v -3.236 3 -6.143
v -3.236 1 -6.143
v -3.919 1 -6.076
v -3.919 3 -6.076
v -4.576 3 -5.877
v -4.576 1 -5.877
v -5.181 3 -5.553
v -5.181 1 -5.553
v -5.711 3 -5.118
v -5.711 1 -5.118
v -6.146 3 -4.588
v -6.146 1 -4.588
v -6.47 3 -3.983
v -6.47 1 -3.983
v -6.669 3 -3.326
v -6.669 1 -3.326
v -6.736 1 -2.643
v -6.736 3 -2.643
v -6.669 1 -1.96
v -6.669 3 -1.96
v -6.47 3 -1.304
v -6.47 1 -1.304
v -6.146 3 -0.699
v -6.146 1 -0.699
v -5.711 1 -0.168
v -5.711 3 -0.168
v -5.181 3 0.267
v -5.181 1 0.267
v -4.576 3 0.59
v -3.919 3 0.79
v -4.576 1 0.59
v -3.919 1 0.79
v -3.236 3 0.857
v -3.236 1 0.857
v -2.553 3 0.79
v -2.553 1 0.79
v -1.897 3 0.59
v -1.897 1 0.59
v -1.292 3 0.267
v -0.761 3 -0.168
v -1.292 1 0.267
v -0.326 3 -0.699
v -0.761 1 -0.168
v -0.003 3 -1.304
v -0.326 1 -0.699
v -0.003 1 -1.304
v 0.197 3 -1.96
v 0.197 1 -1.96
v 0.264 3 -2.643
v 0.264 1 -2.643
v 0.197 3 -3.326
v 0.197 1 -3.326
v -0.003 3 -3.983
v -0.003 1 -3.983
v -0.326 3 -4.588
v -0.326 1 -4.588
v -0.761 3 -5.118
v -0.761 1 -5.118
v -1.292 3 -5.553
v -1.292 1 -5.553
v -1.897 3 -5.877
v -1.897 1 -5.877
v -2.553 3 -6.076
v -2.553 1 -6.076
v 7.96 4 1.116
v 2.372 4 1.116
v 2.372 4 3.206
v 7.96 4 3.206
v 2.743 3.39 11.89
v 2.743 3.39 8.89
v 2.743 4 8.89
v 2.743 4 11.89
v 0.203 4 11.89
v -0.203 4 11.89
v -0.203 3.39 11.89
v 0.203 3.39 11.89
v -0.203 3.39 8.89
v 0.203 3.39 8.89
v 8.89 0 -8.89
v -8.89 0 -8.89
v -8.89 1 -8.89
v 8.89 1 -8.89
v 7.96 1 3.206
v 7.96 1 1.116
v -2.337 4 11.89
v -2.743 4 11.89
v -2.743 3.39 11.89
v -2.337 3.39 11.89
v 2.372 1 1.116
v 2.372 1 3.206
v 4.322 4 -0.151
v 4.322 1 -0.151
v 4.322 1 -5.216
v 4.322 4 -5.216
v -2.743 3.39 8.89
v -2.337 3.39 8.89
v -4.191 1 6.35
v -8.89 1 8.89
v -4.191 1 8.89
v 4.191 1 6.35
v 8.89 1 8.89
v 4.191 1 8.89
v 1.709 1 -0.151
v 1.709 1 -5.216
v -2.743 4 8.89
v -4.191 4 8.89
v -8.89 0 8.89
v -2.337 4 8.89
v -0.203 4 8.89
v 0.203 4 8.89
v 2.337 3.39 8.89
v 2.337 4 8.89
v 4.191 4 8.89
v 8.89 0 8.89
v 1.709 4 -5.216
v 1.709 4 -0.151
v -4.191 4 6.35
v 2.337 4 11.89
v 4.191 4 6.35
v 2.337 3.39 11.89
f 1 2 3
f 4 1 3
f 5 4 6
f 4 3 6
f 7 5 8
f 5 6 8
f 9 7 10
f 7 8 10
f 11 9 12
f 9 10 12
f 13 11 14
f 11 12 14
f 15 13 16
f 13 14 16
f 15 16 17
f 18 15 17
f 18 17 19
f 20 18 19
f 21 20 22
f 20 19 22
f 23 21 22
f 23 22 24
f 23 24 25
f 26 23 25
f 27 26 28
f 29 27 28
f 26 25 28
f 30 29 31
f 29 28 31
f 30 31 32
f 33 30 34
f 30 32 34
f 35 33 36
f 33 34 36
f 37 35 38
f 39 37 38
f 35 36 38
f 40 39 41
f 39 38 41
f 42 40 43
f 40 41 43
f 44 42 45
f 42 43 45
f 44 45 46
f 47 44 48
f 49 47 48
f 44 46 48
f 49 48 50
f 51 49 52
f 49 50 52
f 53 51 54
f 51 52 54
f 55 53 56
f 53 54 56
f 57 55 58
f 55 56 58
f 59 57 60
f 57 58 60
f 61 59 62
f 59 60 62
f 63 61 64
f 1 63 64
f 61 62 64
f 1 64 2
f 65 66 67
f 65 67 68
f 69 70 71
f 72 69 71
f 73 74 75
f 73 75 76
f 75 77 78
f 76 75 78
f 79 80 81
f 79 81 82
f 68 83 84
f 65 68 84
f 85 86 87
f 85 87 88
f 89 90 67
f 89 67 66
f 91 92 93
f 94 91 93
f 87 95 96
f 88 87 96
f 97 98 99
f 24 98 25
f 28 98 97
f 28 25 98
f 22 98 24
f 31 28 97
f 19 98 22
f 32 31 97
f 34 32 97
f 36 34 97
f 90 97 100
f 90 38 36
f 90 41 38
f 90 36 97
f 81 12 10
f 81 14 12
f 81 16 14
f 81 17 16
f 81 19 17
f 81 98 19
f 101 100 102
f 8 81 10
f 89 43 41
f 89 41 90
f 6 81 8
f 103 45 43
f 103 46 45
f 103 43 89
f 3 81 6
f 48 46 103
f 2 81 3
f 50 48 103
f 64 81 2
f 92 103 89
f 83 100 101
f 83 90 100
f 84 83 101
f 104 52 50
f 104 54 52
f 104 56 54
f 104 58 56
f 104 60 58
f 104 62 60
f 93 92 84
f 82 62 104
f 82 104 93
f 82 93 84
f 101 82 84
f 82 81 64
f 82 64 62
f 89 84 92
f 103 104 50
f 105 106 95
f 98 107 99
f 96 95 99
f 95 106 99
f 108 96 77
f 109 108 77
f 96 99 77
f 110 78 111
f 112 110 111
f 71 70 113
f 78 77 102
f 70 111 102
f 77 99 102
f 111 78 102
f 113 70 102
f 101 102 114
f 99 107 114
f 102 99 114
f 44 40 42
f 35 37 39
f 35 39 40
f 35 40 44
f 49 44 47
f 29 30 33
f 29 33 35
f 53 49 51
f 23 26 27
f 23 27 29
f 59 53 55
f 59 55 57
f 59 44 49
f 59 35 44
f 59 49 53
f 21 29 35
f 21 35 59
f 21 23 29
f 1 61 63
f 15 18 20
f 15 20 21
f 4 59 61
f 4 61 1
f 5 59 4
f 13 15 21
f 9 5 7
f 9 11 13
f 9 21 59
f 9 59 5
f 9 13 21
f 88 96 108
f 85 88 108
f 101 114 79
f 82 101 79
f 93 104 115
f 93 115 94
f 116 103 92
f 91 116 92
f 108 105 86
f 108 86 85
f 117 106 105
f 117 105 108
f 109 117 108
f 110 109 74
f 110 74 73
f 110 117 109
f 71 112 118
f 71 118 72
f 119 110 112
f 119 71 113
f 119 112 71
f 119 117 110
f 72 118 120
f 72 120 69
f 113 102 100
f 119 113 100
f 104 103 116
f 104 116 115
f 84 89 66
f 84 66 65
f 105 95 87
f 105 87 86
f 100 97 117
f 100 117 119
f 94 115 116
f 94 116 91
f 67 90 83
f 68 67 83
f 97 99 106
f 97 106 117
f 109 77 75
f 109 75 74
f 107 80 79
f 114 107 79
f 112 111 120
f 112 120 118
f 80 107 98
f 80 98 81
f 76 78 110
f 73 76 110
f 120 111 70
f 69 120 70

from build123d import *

# Parameters (mm, degrees)
SKETCH1_W           = 17.78
SKETCH1_H           = 17.78
BOSS_EXTRUDE1_DEPTH = 1
SKETCH2_R           = 3.5
BOSS_EXTRUDE2_DEPTH = 2
SKETCH3_W           = 5.587821929
SKETCH3_H           = 2.090408203
SKETCH3_W_2         = 2.613010254
SKETCH3_H_2         = 5.065219877
BOSS_EXTRUDE3_DEPTH = 3
SKETCH4_W           = 8.382
SKETCH4_H           = 2.54
BOSS_EXTRUDE4_DEPTH = 3
SKETCH5_W           = 0.4064
SKETCH5_H           = 0.6096
BOSS_EXTRUDE5_DEPTH = 3


with BuildPart() as part:
    # Sketch1 → Boss-Extrude1 (new body)
    with BuildSketch(Plane(origin=(0, 0, 0), x_dir=(1, 0, 0), z_dir=(0, 1, 0))):
        Rectangle(SKETCH1_W, SKETCH1_H)
    extrude(amount=BOSS_EXTRUDE1_DEPTH)

    # Sketch2 → Boss-Extrude2 (add)
    with BuildSketch(Plane(origin=(0, 1, 0), x_dir=(1, 0, 0), z_dir=(0, 1, 0))):
        with Locations(Location((-3.2361127, 2.643160373, 0), (0, 0, 90))):
            Circle(SKETCH2_R)
    extrude(amount=BOSS_EXTRUDE2_DEPTH)

    # Sketch3 → Boss-Extrude3 (add)
    with BuildSketch(Plane(origin=(0, 1, 0), x_dir=(1, 0, 0), z_dir=(0, 1, 0))):
        with Locations((5.165720273, -2.16075848)):
            Rectangle(SKETCH3_W, SKETCH3_H)
        with Locations((3.015011832, 2.68336053)):
            Rectangle(SKETCH3_W_2, SKETCH3_H_2)
    extrude(amount=BOSS_EXTRUDE3_DEPTH)

    # Sketch4 → Boss-Extrude4 (add)
    with BuildSketch(Plane(origin=(0, 1, 0), x_dir=(1, 0, 0), z_dir=(0, 1, 0))):
        with Locations((0, -7.62)):
            Rectangle(SKETCH4_W, SKETCH4_H)
    extrude(amount=BOSS_EXTRUDE4_DEPTH)

    # Sketch5 → Boss-Extrude5 (add)
    with BuildSketch(Plane.XY.offset(8.89)):
        with Locations((-2.54, 3.6952)):
            Rectangle(SKETCH5_W, SKETCH5_H)
        with Locations((0, 3.6952)):
            Rectangle(SKETCH5_W, SKETCH5_H)
        with Locations((2.54, 3.6952)):
            Rectangle(SKETCH5_W, SKETCH5_H)
    extrude(amount=BOSS_EXTRUDE5_DEPTH)


solid = part.part
